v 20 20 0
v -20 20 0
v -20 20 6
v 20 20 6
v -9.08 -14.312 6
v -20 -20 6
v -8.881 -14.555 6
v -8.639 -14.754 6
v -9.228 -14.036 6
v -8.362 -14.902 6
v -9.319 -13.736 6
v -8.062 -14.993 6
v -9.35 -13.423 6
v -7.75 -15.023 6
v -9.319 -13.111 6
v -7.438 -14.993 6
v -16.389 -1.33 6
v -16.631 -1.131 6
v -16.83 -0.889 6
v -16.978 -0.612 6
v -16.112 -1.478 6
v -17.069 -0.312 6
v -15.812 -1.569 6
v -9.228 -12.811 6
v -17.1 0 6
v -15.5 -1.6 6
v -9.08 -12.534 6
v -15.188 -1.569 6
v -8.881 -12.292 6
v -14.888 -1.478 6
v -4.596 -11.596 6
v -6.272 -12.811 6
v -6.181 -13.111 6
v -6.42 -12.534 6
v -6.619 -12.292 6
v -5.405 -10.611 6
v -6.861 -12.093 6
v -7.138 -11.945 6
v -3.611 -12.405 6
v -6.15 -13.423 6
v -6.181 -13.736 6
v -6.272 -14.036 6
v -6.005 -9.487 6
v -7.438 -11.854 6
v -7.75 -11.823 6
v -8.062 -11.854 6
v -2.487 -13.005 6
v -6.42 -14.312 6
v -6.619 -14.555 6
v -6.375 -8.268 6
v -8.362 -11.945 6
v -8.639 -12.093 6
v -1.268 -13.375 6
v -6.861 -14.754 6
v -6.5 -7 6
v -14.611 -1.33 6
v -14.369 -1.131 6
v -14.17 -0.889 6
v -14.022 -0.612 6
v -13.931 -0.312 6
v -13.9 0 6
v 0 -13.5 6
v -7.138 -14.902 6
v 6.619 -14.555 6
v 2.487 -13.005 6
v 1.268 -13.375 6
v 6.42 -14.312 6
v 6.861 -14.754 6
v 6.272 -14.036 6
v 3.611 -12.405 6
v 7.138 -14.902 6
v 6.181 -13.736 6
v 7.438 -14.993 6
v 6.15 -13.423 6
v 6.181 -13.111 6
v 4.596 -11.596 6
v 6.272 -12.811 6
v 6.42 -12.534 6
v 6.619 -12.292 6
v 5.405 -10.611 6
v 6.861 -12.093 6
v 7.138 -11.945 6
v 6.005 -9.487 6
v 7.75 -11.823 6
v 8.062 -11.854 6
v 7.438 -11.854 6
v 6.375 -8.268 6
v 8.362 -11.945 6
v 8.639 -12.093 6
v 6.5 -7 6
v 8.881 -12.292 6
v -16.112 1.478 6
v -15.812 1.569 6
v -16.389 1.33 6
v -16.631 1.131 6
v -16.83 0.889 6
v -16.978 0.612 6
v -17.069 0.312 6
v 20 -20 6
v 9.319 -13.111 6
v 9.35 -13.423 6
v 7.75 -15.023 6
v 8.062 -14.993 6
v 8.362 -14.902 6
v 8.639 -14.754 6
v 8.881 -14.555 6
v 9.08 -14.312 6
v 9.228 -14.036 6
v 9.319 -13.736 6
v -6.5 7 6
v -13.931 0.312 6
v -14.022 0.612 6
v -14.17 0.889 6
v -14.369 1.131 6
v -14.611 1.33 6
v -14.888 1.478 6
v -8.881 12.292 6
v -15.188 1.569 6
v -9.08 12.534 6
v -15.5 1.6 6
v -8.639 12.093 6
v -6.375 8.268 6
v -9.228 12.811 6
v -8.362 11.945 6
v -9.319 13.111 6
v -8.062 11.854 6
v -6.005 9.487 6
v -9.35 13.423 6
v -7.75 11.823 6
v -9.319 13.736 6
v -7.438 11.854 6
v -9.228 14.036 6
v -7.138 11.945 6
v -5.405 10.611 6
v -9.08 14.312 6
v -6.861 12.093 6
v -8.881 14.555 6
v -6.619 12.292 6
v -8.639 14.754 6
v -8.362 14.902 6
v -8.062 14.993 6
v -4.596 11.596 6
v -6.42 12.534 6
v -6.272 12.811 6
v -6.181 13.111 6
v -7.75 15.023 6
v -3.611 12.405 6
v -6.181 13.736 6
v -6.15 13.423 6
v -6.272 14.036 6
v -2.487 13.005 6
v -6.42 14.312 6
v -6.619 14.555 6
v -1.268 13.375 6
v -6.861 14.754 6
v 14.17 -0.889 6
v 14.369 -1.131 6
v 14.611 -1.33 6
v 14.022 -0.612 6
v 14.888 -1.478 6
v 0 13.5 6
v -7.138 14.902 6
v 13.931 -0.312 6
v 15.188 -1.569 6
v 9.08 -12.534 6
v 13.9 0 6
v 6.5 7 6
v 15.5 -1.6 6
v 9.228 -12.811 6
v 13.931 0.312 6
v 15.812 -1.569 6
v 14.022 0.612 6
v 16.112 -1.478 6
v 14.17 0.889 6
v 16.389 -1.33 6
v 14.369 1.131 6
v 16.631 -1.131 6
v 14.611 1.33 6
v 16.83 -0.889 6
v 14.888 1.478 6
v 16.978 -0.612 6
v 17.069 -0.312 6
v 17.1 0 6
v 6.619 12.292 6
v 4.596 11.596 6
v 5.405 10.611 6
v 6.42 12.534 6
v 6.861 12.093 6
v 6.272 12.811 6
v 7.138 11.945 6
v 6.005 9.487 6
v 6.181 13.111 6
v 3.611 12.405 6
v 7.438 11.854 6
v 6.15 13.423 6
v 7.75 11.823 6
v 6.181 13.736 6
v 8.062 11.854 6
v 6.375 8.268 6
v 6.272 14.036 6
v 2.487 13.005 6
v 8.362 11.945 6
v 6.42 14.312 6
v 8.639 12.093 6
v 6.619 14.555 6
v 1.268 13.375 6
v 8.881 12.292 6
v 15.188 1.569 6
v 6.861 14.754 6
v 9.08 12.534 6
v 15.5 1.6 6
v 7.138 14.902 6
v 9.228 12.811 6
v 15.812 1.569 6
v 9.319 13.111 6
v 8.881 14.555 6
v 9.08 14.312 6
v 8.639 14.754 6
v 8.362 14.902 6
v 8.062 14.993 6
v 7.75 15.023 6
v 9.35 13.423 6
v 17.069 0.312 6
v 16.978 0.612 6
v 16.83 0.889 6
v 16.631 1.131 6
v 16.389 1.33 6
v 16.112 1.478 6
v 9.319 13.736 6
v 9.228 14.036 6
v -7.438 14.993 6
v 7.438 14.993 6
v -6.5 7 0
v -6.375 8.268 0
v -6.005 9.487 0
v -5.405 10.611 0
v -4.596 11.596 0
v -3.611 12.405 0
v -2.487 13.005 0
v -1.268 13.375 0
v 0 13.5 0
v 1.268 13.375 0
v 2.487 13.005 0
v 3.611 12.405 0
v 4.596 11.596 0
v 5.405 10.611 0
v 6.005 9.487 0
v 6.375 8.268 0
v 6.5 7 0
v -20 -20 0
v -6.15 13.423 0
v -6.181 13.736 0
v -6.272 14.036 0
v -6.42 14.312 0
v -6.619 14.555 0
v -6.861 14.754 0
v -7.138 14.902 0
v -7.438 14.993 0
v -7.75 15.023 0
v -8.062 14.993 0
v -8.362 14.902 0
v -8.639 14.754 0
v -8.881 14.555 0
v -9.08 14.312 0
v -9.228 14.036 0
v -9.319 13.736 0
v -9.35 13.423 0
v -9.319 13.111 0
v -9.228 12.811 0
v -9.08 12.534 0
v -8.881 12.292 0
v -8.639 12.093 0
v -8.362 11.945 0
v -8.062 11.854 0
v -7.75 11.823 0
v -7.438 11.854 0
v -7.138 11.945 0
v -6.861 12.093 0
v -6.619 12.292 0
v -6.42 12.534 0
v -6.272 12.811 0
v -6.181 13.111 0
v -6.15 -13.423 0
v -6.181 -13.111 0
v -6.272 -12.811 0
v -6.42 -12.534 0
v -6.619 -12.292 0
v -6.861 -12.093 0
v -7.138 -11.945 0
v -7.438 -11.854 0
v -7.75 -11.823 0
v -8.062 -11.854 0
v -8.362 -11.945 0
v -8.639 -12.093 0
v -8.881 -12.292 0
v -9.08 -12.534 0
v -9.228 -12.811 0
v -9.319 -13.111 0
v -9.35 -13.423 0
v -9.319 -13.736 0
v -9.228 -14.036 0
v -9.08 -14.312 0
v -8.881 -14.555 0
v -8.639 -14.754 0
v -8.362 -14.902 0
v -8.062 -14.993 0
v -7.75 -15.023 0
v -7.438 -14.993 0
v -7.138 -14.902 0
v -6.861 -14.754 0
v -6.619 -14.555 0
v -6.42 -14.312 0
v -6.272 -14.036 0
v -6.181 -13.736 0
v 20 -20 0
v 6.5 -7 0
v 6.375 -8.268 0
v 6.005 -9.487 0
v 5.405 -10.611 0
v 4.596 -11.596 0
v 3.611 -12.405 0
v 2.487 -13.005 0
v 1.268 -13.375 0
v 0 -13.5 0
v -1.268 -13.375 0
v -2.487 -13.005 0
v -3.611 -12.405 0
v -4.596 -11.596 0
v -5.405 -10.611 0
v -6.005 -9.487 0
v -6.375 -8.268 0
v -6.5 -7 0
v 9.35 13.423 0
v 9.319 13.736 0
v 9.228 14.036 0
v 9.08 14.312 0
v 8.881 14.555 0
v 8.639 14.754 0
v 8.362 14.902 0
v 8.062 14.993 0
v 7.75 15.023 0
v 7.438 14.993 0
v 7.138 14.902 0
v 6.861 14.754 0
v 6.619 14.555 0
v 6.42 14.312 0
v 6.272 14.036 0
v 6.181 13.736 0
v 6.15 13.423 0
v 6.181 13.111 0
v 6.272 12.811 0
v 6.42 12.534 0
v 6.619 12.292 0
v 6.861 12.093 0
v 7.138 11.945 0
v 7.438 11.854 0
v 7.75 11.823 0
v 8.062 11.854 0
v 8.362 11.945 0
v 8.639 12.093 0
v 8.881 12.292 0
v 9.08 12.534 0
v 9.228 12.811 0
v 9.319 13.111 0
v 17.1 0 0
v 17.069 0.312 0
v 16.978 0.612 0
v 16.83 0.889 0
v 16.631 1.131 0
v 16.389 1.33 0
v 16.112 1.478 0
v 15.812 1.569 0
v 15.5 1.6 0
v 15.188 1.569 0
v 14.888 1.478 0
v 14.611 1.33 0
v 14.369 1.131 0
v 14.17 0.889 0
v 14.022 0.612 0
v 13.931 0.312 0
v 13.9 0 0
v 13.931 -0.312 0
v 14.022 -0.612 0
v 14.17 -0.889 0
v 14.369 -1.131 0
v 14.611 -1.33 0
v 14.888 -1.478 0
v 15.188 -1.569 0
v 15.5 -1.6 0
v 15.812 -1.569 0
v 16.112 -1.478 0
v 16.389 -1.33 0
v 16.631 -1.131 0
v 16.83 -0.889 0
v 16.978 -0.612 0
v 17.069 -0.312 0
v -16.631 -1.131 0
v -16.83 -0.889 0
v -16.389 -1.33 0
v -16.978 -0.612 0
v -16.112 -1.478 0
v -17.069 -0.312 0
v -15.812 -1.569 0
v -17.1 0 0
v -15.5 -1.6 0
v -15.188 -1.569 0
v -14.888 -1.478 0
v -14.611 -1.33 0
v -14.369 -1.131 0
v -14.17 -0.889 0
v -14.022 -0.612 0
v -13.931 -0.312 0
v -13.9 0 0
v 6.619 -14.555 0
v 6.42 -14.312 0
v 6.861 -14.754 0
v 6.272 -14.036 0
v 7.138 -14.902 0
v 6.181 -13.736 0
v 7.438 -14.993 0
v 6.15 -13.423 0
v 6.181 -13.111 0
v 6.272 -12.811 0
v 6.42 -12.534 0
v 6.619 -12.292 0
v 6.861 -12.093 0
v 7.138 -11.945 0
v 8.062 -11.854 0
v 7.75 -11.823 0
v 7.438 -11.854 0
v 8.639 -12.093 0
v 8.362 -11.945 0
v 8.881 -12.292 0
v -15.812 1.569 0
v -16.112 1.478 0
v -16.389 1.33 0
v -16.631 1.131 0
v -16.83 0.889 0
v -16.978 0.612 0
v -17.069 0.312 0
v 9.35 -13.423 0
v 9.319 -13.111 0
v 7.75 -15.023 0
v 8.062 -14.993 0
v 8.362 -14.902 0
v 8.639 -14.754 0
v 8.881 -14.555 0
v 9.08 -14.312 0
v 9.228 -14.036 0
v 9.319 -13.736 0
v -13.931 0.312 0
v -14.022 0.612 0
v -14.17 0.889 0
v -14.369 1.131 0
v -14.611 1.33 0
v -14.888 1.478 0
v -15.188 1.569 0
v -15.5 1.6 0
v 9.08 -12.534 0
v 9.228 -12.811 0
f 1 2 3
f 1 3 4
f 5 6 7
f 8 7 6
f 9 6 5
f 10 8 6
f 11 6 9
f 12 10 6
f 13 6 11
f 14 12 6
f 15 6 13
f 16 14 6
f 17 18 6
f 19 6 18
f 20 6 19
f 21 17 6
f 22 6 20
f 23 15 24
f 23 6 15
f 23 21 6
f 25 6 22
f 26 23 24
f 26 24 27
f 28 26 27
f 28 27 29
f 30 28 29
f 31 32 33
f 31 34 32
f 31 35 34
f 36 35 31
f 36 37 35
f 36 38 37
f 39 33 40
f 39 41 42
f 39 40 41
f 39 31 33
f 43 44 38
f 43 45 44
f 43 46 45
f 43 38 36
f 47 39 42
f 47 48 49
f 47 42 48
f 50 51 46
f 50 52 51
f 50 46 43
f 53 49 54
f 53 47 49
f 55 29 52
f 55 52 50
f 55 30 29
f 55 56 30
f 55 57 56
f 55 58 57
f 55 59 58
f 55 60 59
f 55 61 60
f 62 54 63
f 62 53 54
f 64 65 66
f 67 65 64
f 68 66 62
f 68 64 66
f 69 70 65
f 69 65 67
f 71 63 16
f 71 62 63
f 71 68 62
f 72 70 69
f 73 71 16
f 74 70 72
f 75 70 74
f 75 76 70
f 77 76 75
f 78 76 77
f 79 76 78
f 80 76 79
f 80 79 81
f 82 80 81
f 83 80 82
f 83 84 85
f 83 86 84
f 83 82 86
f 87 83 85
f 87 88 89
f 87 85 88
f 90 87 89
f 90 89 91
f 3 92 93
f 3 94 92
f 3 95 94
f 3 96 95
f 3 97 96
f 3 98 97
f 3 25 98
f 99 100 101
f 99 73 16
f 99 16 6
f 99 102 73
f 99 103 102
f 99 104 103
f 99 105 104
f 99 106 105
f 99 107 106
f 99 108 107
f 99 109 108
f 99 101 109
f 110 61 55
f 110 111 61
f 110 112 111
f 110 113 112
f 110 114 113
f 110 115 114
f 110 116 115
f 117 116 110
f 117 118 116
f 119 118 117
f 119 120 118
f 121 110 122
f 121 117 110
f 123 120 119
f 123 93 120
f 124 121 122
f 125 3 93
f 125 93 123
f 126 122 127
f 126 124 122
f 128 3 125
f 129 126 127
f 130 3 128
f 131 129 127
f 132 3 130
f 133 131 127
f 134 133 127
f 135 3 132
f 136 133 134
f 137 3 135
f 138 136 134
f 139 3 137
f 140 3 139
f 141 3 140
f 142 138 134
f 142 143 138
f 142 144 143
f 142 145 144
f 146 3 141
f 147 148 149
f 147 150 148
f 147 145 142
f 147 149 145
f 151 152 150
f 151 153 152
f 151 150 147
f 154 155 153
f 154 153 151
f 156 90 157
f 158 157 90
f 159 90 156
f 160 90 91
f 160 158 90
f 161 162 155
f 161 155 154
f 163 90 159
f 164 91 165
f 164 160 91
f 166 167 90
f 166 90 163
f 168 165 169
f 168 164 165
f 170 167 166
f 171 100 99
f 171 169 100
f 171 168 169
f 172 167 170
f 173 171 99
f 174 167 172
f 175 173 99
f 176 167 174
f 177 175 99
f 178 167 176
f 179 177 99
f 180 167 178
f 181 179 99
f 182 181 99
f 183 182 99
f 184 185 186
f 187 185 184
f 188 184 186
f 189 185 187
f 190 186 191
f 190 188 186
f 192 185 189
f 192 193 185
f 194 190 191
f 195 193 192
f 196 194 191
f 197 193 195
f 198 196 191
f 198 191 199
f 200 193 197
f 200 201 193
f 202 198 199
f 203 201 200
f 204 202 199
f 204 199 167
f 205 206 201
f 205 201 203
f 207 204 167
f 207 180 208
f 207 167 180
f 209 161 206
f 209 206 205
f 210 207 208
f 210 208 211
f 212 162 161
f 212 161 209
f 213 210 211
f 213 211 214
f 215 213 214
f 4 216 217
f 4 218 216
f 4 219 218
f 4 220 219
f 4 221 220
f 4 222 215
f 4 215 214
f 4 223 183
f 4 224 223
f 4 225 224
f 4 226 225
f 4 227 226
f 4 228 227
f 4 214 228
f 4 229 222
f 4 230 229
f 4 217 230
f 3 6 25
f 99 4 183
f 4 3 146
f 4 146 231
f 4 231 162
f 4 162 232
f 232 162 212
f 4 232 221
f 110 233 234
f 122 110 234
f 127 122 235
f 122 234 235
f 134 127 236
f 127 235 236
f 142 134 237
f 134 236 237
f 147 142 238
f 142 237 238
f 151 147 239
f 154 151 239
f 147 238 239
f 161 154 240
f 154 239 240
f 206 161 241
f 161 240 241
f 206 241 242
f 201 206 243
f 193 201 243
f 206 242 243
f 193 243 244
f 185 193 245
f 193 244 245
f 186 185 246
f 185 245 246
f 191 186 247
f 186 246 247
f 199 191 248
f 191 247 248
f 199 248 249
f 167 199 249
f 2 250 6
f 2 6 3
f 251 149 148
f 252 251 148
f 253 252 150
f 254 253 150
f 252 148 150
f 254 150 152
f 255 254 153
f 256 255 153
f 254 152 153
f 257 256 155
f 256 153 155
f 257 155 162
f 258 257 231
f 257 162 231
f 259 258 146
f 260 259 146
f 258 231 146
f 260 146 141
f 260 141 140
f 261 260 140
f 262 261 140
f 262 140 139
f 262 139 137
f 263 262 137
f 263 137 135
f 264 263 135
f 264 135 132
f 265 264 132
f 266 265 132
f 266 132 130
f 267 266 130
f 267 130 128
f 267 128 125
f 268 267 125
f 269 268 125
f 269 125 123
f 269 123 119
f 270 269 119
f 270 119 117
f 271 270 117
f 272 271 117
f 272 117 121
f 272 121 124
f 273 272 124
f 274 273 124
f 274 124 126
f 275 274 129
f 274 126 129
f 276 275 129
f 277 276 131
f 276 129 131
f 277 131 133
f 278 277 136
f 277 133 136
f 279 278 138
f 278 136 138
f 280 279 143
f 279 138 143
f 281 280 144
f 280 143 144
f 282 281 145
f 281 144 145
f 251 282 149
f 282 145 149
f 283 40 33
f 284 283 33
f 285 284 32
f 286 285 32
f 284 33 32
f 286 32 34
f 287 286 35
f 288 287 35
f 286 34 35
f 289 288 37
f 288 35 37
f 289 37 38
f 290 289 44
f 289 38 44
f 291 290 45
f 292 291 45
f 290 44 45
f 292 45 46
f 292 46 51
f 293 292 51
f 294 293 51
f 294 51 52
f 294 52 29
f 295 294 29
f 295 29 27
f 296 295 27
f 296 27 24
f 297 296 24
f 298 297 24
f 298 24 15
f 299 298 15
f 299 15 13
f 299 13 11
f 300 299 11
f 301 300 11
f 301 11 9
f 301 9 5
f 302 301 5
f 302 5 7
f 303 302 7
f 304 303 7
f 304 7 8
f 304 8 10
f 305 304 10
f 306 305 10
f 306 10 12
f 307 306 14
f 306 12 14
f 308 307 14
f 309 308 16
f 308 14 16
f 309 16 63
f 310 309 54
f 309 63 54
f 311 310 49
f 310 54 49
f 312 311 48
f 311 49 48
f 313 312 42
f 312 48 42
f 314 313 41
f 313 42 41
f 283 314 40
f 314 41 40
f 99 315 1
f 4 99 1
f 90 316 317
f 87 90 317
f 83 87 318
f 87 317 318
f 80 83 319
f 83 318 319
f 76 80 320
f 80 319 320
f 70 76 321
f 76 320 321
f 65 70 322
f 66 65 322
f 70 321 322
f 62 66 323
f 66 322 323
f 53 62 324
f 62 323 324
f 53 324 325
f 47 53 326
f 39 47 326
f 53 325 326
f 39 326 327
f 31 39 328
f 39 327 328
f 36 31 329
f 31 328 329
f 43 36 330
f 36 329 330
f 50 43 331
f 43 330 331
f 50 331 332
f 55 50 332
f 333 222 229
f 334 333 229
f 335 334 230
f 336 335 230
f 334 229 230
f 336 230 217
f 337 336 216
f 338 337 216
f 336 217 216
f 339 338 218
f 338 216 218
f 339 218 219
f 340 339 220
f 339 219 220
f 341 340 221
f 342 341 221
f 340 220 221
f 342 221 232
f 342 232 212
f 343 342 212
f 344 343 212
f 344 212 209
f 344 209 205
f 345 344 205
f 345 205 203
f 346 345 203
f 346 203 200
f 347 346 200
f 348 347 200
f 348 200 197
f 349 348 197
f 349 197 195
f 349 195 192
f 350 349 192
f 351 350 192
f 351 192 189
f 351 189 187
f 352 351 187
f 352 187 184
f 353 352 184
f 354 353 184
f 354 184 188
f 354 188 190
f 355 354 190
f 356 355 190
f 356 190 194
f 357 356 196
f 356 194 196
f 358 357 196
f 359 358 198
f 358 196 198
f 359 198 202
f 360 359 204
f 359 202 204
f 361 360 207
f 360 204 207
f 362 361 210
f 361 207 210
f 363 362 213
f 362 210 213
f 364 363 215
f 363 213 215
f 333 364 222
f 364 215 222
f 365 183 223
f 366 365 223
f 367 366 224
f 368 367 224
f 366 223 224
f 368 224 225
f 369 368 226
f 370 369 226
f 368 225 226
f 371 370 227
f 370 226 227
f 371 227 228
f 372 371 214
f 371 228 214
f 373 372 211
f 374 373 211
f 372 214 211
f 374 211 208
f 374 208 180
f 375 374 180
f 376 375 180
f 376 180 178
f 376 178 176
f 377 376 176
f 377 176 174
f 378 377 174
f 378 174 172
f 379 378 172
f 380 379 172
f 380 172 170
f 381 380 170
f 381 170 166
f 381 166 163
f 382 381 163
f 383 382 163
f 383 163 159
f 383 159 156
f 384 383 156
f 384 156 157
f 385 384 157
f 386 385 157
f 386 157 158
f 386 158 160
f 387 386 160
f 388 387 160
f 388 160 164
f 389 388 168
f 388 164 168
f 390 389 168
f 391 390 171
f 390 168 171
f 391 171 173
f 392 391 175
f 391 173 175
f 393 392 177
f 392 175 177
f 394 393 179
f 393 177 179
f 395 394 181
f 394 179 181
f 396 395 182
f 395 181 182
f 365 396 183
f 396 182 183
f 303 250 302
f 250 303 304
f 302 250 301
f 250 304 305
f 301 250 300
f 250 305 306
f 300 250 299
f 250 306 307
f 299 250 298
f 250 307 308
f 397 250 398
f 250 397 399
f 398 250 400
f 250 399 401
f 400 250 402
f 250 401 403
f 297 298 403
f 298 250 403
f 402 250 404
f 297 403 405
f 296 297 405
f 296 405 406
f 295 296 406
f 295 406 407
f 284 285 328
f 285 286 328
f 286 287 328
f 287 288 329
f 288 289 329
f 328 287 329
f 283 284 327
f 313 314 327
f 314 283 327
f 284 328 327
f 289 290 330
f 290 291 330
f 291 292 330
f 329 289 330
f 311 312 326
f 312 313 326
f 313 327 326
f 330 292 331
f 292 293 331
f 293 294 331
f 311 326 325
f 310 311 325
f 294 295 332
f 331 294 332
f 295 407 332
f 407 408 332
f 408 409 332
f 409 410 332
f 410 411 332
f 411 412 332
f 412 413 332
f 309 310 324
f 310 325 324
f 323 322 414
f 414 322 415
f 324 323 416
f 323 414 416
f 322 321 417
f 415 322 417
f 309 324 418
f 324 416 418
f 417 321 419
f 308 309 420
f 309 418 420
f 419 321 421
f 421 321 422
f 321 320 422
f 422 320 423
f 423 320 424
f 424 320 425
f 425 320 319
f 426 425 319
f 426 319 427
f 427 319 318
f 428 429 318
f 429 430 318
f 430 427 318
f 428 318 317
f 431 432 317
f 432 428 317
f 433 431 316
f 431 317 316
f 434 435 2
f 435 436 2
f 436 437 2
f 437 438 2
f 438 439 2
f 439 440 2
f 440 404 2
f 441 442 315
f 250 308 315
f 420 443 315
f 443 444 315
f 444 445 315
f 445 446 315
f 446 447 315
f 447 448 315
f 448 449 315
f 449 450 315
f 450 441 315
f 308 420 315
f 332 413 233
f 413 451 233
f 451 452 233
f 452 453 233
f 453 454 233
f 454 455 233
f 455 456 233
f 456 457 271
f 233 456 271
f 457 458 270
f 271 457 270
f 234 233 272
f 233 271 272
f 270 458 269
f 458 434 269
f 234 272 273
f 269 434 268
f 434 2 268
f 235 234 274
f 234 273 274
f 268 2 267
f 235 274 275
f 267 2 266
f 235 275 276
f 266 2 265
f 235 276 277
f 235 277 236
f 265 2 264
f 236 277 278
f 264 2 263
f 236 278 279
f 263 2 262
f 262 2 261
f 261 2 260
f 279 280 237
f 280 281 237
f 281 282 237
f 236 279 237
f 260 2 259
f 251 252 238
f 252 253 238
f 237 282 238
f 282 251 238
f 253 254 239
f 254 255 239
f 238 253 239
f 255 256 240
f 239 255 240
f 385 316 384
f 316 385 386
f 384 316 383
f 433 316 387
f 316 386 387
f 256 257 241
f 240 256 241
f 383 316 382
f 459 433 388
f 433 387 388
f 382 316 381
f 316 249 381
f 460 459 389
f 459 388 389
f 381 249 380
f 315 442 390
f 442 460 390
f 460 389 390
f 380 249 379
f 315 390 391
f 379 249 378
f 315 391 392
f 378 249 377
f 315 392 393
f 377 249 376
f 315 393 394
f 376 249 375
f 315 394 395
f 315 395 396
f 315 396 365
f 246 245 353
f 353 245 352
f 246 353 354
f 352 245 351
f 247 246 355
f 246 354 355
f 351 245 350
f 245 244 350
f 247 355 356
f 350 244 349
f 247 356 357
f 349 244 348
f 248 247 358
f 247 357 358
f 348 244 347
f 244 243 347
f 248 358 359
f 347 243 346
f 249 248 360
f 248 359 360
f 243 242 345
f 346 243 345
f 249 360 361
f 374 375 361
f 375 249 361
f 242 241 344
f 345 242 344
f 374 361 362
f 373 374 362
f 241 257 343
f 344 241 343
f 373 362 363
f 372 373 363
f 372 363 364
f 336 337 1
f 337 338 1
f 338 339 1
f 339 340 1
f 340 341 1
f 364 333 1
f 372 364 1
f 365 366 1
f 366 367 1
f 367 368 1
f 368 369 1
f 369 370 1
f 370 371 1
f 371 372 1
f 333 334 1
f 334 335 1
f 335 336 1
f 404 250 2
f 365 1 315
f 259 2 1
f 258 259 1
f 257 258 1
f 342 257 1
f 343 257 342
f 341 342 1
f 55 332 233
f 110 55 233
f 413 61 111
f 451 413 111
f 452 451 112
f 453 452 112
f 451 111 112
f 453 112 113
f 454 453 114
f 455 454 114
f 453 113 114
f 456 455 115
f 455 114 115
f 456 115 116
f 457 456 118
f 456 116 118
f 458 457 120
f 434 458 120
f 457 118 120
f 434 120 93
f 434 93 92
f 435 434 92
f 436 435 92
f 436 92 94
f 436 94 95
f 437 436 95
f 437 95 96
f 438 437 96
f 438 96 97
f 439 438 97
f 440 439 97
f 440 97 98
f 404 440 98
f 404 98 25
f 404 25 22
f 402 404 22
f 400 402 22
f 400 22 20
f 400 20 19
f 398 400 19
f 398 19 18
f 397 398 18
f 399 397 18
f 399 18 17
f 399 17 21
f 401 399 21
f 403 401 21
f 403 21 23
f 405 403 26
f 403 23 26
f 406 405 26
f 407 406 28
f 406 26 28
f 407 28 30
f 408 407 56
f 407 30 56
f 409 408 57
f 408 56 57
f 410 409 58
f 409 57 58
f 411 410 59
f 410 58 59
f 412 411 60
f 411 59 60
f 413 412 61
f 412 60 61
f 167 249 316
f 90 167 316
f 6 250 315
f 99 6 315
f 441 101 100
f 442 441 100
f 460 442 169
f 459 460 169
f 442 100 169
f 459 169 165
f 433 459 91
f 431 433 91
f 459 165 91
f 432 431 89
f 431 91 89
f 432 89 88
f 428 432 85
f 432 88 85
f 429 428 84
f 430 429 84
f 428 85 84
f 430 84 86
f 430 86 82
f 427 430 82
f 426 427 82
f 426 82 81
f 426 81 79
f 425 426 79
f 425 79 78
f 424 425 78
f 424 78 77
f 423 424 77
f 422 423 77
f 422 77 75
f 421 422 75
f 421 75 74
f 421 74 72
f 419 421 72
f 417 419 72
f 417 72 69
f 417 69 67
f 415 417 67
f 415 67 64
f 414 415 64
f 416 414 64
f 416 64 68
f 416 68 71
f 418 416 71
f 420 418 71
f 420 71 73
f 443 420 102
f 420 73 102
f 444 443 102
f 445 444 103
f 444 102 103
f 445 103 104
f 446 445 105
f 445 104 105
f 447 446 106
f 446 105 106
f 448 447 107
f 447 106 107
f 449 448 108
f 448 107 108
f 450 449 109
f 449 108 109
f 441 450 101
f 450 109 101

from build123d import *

# Parameters (mm, degrees)
SKETCH_1_W               = 40
SKETCH_1_H               = 40
EXTRUDE_1_DEPTH          = 6
CUT_EXTRUDE_1_DEPTH      = 29.91366459
CUT_EXTRUDE_1_DEPTH_BACK = 29.91366459
SKETCH_3_R               = 1.6
CUT_EXTRUDE_2_DEPTH      = 29.91366459


with BuildPart() as part:
    # 草圖1 → 填料-伸長1 (new body)
    with BuildSketch(Plane.XY):
        Rectangle(SKETCH_1_W, SKETCH_1_H)
    extrude(amount=EXTRUDE_1_DEPTH)

    # 草圖2 → 除料-伸長1 (cut, two sides: drawn at the far end of the back side and taken through both)
    with BuildSketch(Plane.XY.offset(6).offset(-CUT_EXTRUDE_1_DEPTH_BACK)):
        with BuildLine():
            Line((-6.5, -7), (-6.5, 7))
            ThreePointArc((-6.5, 7), (0, 13.5), (6.5, 7))
            Line((6.5, 7), (6.5, -7))
            ThreePointArc((6.5, -7), (0, -13.5), (-6.5, -7))
        make_face()
    extrude(amount=CUT_EXTRUDE_1_DEPTH + CUT_EXTRUDE_1_DEPTH_BACK, mode=Mode.SUBTRACT)

    # 草圖3 → 除料-伸長2 (cut, through all)
    with BuildSketch(Plane.XY.offset(6)):
        with Locations((-15.5, 0)):
            Circle(SKETCH_3_R)
        with Locations((-7.75, 13.423393759)):
            Circle(SKETCH_3_R)
        with Locations((7.75, 13.423393759)):
            Circle(SKETCH_3_R)
        with Locations((15.5, 0)):
            Circle(SKETCH_3_R)
        with Locations((7.75, -13.423393759)):
            Circle(SKETCH_3_R)
        with Locations((-7.75, -13.423393759)):
            Circle(SKETCH_3_R)
    extrude(amount=-CUT_EXTRUDE_2_DEPTH, mode=Mode.SUBTRACT)


solid = part.part
